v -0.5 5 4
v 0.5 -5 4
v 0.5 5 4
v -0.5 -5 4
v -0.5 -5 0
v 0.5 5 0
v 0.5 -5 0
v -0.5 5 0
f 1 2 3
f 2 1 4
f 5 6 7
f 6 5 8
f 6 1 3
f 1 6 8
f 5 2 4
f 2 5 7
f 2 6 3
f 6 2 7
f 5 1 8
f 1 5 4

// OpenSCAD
// file: ../lib/at01_inverted_core_snap.scad
// File: at01_inverted_core_snap.scad
// AT-01 — experiment-owned inverted fixed-core / removable-shell snap.
//
// This geometry does not copy the QuackWorks/OpenGrid snap. It keeps only the
// high-level design lessons: compact fixed side, removable compliant side,
// explicit locating/retention roles, and a Lite-like 4.0 / 3.4 mm Z baseline.

// Fixed-side baseline.
AT01_CORE_SIZE = 10.0;
AT01_CORE_HEIGHT = 4.0;
AT01_ROOT_SHOULDER = 0.6;
AT01_ENGAGEMENT_HEIGHT = 3.4;

// Removable shell.
AT01_CLEARANCE = 0.20;              // per side on nominal 10 x 10 core
AT01_SHELL_WALL = 1.20;
AT01_SHELL_TOP = 1.20;
AT01_SHELL_INNER = AT01_CORE_SIZE + 2 * AT01_CLEARANCE;
AT01_SHELL_OUTER = AT01_SHELL_INNER + 2 * AT01_SHELL_WALL;
AT01_SHELL_HEIGHT = AT01_ENGAGEMENT_HEIGHT + AT01_SHELL_TOP;

// Two-sided retention on +/-X.
AT01_RIB_PROTRUSION = 0.35;
AT01_RIB_WIDTH = 4.0;
AT01_RIB_Z_BOTTOM = 0.75;
AT01_RIB_Z_LOWER_MAX = 0.95;
AT01_RIB_Z_UPPER_MAX = 1.15;
AT01_RIB_Z_TOP = 1.60;

// Receiving window in each compliant shell tongue.
// Values are shell-local; assembled shell starts at Z=AT01_ROOT_SHOULDER.
AT01_WINDOW_WIDTH = 4.8;
AT01_WINDOW_Z_MIN = 0.05;
AT01_WINDOW_Z_MAX = 1.10;

// Two relief slots isolate the center tongue on each +/-X wall.
AT01_FLEX_SLOT_Y = 3.0;
AT01_FLEX_SLOT_WIDTH = 0.8;

// Evidence helpers.
AT01_EXPLODED_Z = 8.0;
AT01_PROFILE_SLICE = 1.0;

assert(
    abs(AT01_ROOT_SHOULDER + AT01_ENGAGEMENT_HEIGHT - AT01_CORE_HEIGHT) < 0.0001,
    "AT-01 Lite baseline must satisfy shoulder + engagement = 4.0 mm."
);
assert(
    abs(AT01_SHELL_INNER - (AT01_CORE_SIZE + 2 * AT01_CLEARANCE)) < 0.0001,
    "AT-01 shell inner size must preserve the stated side clearance."
);

module _at01_positive_x_retention_rib() {
    // Polygon is defined in X/Z and extruded along Y.
    rotate([90, 0, 0])
        linear_extrude(height = AT01_RIB_WIDTH, center = true, convexity = 10)
            polygon(points = [
                [AT01_CORE_SIZE / 2, AT01_RIB_Z_BOTTOM],
                [AT01_CORE_SIZE / 2 + AT01_RIB_PROTRUSION, AT01_RIB_Z_LOWER_MAX],
                [AT01_CORE_SIZE / 2 + AT01_RIB_PROTRUSION, AT01_RIB_Z_UPPER_MAX],
                [AT01_CORE_SIZE / 2, AT01_RIB_Z_TOP]
            ]);
}

module at01_fixed_core() {
    union() {
        translate([-AT01_CORE_SIZE / 2, -AT01_CORE_SIZE / 2, 0])
            cube([AT01_CORE_SIZE, AT01_CORE_SIZE, AT01_CORE_HEIGHT]);

        _at01_positive_x_retention_rib();

        mirror([1, 0, 0])
            _at01_positive_x_retention_rib();
    }
}

module _at01_shell_outer() {
    translate([-AT01_SHELL_OUTER / 2, -AT01_SHELL_OUTER / 2, 0])
        cube([AT01_SHELL_OUTER, AT01_SHELL_OUTER, AT01_SHELL_HEIGHT]);
}

module _at01_shell_cavity() {
    // Ends exactly at the underside of the top plate.
    translate([-AT01_SHELL_INNER / 2, -AT01_SHELL_INNER / 2, -0.05])
        cube([AT01_SHELL_INNER, AT01_SHELL_INNER, AT01_ENGAGEMENT_HEIGHT + 0.05]);
}

module _at01_retention_window(x_sign = 1) {
    wall_center = (AT01_SHELL_INNER / 2 + AT01_SHELL_OUTER / 2) / 2;
    translate([
        x_sign * wall_center,
        0,
        (AT01_WINDOW_Z_MIN + AT01_WINDOW_Z_MAX) / 2
    ])
        cube([
            AT01_SHELL_WALL + 0.4,
            AT01_WINDOW_WIDTH,
            AT01_WINDOW_Z_MAX - AT01_WINDOW_Z_MIN
        ], center = true);
}

module _at01_flex_slot(x_sign = 1, y_sign = 1) {
    wall_center = (AT01_SHELL_INNER / 2 + AT01_SHELL_OUTER / 2) / 2;
    translate([
        x_sign * wall_center,
        y_sign * AT01_FLEX_SLOT_Y,
        AT01_ENGAGEMENT_HEIGHT / 2
    ])
        cube([
            AT01_SHELL_WALL + 0.4,
            AT01_FLEX_SLOT_WIDTH,
            AT01_ENGAGEMENT_HEIGHT + 0.10
        ], center = true);
}

module at01_removable_shell() {
    difference() {
        _at01_shell_outer();
        _at01_shell_cavity();

        for (x_sign = [-1, 1]) {
            _at01_retention_window(x_sign);

            for (y_sign = [-1, 1])
                _at01_flex_slot(x_sign, y_sign);
        }
    }
}

module at01_assembled(shell_alpha = 0.55) {
    color([0.68, 0.70, 0.74])
        at01_fixed_core();

    translate([0, 0, AT01_ROOT_SHOULDER])
        color([0.92, 0.30, 0.12, shell_alpha])
            at01_removable_shell();
}

module at01_exploded() {
    color([0.68, 0.70, 0.74])
        at01_fixed_core();

    translate([0, 0, AT01_ROOT_SHOULDER + AT01_EXPLODED_Z])
        color([0.92, 0.30, 0.12])
            at01_removable_shell();
}

module _at01_retention_slice_volume() {
    translate([-20, -AT01_PROFILE_SLICE / 2, -1])
        cube([40, AT01_PROFILE_SLICE, 12]);
}

module _at01_locating_slice_volume() {
    translate([-AT01_PROFILE_SLICE / 2, -20, -1])
        cube([AT01_PROFILE_SLICE, 40, 12]);
}

module at01_fixed_retention_profile() {
    intersection() {
        at01_fixed_core();
        _at01_retention_slice_volume();
    }
}

module at01_shell_retention_profile() {
    intersection() {
        at01_removable_shell();
        translate([0, 0, -AT01_ROOT_SHOULDER])
            _at01_retention_slice_volume();
    }
}

module at01_fixed_locating_profile() {
    intersection() {
        at01_fixed_core();
        _at01_locating_slice_volume();
    }
}

module at01_shell_locating_profile() {
    intersection() {
        at01_removable_shell();
        translate([0, 0, -AT01_ROOT_SHOULDER])
            _at01_locating_slice_volume();
    }
}

module at01_retention_section() {
    color([0.68, 0.70, 0.74])
        at01_fixed_retention_profile();

    translate([0, 0, AT01_ROOT_SHOULDER])
        color([0.92, 0.30, 0.12])
            at01_shell_retention_profile();
}

module at01_locating_section() {
    color([0.68, 0.70, 0.74])
        at01_fixed_locating_profile();

    translate([0, 0, AT01_ROOT_SHOULDER])
        color([0.92, 0.30, 0.12])
            at01_shell_locating_profile();
}
// main file
include <../lib/at01_inverted_core_snap.scad>
at01_fixed_locating_profile();
